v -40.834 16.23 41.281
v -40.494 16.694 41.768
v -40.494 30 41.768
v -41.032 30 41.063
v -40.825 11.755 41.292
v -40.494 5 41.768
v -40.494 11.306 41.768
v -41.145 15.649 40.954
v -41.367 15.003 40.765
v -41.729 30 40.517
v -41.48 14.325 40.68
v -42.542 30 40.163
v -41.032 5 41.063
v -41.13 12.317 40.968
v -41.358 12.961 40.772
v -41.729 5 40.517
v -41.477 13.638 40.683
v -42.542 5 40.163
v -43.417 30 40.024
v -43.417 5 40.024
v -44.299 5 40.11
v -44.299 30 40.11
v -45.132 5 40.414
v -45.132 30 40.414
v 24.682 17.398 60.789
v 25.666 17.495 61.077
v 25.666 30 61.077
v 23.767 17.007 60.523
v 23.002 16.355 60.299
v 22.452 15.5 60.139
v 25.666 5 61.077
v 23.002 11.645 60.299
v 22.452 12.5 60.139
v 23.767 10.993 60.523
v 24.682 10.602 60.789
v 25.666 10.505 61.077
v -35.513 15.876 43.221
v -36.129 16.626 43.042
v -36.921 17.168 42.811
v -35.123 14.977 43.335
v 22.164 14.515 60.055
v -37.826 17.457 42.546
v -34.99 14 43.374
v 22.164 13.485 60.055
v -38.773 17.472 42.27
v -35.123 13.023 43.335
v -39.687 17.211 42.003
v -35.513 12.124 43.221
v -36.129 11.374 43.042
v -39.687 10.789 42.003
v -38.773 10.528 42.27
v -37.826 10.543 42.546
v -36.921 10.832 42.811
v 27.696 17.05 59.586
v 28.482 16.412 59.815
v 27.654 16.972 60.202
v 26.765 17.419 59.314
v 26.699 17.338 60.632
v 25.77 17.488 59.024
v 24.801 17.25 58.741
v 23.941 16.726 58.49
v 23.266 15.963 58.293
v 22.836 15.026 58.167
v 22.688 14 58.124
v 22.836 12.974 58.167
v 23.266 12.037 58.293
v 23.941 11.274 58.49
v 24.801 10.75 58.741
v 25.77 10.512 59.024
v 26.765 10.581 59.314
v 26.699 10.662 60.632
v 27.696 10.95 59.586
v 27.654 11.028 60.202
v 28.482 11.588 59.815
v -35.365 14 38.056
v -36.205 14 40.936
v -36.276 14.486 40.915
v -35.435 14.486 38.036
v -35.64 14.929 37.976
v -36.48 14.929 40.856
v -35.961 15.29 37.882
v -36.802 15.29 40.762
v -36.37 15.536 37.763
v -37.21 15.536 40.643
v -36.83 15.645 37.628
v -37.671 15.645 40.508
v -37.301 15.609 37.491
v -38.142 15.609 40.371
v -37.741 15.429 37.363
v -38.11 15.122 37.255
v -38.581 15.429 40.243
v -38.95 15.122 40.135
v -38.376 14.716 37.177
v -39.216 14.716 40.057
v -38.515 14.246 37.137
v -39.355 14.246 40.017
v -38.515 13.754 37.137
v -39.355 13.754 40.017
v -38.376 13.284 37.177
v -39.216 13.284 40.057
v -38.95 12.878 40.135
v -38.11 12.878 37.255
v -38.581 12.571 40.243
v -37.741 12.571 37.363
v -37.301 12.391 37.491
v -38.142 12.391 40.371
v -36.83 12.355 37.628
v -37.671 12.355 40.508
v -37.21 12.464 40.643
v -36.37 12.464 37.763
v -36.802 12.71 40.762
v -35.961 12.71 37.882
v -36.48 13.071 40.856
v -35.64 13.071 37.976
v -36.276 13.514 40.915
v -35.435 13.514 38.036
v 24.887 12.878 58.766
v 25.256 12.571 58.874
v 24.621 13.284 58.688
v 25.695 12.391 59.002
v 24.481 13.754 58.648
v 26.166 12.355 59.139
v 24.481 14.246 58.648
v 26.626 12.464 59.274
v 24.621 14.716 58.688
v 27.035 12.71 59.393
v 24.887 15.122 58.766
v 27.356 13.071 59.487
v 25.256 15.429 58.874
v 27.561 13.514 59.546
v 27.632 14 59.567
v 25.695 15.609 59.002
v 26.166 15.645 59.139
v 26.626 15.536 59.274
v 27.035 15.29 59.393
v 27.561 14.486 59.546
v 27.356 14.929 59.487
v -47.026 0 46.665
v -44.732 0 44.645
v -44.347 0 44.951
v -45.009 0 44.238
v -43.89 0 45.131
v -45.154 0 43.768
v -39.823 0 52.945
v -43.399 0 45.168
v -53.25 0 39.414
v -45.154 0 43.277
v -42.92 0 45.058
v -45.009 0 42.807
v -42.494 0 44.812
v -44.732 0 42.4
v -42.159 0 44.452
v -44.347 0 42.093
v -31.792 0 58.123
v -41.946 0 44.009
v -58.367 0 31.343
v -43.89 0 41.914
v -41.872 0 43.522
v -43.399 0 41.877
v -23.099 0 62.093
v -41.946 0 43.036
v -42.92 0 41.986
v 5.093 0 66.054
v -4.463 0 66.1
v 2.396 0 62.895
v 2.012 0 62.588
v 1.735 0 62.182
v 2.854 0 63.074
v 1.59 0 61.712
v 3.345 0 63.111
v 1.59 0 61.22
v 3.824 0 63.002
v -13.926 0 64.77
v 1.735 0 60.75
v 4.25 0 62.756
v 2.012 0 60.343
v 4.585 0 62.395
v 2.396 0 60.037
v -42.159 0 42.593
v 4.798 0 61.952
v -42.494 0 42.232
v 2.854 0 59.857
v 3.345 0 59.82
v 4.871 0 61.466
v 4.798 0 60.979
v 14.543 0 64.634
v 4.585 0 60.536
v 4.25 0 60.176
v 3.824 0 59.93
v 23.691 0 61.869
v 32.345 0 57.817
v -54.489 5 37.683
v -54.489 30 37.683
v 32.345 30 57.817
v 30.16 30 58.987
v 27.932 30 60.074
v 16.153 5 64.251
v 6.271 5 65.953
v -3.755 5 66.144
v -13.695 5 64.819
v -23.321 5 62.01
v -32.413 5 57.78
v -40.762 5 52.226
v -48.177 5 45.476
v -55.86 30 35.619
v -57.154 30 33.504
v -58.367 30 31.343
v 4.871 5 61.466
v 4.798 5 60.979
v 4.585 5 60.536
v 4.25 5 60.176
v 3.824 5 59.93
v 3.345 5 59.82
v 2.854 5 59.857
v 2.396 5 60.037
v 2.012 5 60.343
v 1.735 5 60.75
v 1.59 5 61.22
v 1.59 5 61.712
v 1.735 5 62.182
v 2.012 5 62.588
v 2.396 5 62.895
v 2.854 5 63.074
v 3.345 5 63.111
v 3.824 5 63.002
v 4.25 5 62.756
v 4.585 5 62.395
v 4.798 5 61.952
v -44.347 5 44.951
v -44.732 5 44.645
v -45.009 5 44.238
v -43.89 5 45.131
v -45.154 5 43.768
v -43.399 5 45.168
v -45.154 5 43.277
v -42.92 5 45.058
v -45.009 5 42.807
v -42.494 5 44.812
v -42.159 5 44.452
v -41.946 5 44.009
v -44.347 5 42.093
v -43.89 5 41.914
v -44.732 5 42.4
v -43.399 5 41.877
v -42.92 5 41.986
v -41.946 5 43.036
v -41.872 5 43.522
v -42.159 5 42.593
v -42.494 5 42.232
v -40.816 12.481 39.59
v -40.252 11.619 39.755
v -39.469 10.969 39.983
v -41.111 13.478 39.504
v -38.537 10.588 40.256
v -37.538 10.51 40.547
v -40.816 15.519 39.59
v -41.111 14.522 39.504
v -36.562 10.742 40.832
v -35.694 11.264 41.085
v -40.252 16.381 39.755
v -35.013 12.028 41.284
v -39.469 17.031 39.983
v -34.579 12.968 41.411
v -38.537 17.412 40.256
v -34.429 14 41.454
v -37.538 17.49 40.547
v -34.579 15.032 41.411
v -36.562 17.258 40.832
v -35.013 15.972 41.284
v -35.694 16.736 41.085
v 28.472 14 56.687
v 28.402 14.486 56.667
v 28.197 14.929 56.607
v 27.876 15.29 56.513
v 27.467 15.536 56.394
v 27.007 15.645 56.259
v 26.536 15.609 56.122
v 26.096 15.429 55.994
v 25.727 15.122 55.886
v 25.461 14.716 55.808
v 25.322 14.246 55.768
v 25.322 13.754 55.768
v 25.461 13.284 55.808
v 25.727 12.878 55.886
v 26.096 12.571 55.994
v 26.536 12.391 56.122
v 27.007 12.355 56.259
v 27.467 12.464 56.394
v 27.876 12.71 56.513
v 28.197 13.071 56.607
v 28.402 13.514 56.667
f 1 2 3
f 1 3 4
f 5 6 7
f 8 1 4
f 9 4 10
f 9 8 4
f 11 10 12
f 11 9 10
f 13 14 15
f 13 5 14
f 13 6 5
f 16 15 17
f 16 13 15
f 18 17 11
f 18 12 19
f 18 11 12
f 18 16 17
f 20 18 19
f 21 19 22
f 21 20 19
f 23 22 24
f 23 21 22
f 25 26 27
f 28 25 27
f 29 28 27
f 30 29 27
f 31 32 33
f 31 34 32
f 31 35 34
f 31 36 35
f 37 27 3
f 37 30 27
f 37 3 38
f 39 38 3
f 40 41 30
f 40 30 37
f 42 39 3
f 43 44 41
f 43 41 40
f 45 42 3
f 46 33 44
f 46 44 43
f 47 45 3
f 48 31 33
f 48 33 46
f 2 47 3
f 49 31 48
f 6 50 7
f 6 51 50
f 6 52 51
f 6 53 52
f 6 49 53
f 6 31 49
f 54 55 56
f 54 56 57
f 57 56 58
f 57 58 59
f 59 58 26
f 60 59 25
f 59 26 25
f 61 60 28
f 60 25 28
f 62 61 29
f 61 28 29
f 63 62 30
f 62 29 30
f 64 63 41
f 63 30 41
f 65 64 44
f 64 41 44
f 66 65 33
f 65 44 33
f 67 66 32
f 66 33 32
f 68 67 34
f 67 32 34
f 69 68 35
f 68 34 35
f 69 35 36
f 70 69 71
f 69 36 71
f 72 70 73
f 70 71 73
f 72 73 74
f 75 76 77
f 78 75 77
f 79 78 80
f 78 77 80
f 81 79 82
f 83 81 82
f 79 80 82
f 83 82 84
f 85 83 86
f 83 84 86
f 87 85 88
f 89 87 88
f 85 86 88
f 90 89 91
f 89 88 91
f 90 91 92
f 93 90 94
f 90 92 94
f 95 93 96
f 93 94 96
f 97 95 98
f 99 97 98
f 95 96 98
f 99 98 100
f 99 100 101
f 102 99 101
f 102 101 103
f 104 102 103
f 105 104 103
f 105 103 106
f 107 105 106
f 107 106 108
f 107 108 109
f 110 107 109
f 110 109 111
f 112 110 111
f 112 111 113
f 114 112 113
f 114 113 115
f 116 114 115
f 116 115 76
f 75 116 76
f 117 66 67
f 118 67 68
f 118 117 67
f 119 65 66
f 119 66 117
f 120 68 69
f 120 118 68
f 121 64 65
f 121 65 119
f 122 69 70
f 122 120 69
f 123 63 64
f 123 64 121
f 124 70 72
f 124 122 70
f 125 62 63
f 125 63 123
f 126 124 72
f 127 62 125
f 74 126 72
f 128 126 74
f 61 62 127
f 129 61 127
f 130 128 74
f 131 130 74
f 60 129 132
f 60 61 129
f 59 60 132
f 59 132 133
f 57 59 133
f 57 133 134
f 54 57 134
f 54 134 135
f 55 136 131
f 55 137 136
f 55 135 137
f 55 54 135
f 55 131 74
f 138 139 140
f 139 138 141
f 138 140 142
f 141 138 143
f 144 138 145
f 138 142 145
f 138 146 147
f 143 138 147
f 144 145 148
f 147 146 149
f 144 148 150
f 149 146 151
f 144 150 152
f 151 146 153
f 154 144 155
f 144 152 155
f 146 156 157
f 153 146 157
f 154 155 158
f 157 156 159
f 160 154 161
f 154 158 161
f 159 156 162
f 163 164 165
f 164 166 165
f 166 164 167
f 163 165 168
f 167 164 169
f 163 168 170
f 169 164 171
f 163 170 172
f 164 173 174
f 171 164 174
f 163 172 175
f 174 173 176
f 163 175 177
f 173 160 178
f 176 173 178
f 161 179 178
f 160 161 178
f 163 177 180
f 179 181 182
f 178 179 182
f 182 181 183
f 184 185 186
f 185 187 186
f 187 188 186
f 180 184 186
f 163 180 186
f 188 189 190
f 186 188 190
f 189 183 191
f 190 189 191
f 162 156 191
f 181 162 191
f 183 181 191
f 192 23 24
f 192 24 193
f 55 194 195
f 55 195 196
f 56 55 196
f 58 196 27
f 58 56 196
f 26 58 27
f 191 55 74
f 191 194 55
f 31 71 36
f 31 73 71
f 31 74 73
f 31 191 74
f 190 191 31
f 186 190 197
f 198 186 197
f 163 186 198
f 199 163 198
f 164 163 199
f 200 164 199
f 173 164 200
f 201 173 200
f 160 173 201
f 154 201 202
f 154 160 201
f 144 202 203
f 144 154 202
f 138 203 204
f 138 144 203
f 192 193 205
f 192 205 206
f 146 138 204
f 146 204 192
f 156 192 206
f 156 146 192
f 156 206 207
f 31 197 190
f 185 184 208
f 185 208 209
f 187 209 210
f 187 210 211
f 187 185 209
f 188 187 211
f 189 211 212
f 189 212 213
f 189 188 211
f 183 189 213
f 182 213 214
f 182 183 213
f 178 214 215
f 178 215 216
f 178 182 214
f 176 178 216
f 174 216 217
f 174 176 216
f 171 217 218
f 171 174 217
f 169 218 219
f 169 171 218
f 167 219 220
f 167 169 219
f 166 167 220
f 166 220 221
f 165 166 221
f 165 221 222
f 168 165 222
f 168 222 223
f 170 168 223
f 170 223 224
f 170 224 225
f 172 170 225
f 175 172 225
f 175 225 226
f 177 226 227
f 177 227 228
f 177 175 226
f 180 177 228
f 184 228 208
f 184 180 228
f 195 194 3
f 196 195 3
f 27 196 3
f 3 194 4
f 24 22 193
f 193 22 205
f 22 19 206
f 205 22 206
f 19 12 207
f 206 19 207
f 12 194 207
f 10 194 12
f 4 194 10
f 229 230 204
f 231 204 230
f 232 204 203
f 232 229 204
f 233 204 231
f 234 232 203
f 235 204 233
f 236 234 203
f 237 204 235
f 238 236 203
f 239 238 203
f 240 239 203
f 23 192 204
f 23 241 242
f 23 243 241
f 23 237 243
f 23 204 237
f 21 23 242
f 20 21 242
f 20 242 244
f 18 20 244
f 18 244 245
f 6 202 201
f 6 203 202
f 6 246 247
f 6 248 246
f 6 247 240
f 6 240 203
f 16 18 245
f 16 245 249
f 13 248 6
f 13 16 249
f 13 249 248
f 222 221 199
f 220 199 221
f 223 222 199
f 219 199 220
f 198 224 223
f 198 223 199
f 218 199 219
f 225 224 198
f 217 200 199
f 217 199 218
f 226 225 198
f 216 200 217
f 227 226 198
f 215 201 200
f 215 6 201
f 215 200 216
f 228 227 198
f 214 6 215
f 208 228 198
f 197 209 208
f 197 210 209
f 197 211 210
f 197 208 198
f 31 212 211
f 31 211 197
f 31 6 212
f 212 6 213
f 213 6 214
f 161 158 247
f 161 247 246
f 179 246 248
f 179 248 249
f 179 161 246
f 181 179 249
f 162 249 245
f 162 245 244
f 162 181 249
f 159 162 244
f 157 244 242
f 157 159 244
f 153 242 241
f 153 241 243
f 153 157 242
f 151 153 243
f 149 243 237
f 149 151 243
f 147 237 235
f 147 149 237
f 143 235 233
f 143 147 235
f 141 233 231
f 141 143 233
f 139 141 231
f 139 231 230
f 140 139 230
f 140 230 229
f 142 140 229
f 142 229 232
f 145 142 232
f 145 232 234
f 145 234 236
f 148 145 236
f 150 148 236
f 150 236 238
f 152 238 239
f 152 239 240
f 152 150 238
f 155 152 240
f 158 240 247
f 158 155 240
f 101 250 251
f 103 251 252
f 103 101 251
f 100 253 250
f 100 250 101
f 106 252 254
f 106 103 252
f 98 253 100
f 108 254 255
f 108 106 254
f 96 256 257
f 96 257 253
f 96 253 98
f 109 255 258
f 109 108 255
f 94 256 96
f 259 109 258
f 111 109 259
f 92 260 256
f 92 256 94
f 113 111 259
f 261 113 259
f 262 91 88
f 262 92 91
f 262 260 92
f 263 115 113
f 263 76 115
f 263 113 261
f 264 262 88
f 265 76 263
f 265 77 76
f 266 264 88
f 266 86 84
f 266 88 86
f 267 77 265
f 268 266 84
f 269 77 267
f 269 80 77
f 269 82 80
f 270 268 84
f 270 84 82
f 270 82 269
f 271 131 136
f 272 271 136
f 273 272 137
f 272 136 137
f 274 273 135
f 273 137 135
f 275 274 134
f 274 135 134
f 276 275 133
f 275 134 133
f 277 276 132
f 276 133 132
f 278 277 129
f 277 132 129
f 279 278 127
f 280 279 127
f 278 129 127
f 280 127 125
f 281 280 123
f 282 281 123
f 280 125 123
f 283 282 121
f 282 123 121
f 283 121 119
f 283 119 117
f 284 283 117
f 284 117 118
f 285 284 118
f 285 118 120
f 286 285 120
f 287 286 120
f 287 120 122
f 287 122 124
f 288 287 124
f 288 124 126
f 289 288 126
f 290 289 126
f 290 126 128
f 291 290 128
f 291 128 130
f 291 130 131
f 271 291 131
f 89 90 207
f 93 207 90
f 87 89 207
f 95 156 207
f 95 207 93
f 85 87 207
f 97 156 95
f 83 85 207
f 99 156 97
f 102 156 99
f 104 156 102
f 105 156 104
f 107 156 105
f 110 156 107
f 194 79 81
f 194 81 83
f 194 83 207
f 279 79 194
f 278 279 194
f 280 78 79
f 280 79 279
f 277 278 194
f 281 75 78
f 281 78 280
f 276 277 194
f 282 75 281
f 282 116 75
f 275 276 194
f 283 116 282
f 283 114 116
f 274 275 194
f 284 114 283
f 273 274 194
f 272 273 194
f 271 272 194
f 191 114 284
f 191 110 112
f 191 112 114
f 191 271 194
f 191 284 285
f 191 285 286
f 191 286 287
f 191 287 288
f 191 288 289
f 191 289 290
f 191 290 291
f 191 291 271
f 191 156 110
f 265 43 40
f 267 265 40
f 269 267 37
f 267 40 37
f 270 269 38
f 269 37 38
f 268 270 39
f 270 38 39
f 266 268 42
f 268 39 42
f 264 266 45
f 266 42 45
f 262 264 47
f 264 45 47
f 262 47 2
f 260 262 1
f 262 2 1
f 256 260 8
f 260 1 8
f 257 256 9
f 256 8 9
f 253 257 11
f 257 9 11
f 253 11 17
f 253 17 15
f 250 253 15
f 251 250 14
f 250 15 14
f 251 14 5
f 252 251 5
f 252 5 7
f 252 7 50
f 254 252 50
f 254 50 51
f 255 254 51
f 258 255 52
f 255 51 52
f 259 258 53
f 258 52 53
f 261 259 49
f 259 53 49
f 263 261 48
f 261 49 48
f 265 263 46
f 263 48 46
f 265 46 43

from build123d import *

# Parameters (mm, degrees)
SKETCH1_R           = 1.65
BOSS_EXTRUDE1_DEPTH = 5
BOSS_EXTRUDE2_DEPTH = 25
SKETCH3_R           = 1.65
CUT_EXTRUDE1_DEPTH  = 31.640005718
SKETCH4_R           = 3.5
CUT_EXTRUDE2_DEPTH  = 2
SKETCH5_R           = 67.5
SKETCH5_R_2         = 66.25
CUT_EXTRUDE3_DEPTH  = 31.0000001


with BuildPart() as part:
    # Sketch1 → Boss-Extrude1 (new body)
    with BuildSketch(Plane(origin=(0, 0, 0), x_dir=(1, 0, 0), z_dir=(0, 1, 0))):
        with BuildLine():
            ThreePointArc((-58.769725256, -31.225340563), (-18.644922026, -63.884813396), (32.748082014, -57.935012077))
            Line((32.748082014, -57.935012077), (-58.769725256, -31.225340563))
        make_face()
        with Locations((-43.522422382, -43.522422382)):
            Circle(SKETCH1_R, mode=Mode.SUBTRACT)
        with Locations((3.221278107, -61.465647864)):
            Circle(SKETCH1_R, mode=Mode.SUBTRACT)
    extrude(amount=BOSS_EXTRUDE1_DEPTH)

    # Sketch2 → Boss-Extrude2 (add)
    with BuildSketch(Plane(origin=(0, 5, 0), x_dir=(1, 0, 0), z_dir=(0, 1, 0))):
        with BuildLine():
            Line((-58.769725256, -31.225340563), (32.748082014, -57.935012077))
            ThreePointArc((32.748082014, -57.935012077), (29.480015366, -59.664320946), (26.120952253, -61.20946294))
            Line((26.120952253, -61.20946294), (-40.494047404, -41.767730103))
            ThreePointArc((-40.494047404, -41.767730103), (-42.54184797, -40.162589972), (-45.131562946, -40.414261085))
            Line((-45.131562946, -40.414261085), (-54.944236671, -37.550410872))
            ThreePointArc((-54.944236671, -37.550410872), (-56.94486731, -34.441030575), (-58.769725256, -31.225340563))
        make_face()
    extrude(amount=BOSS_EXTRUDE2_DEPTH)

    # Sketch3 → Cut-Extrude1 (cut, through all)
    with BuildSketch(Plane(origin=(-14.411642209, 0, 49.379936906), x_dir=(0.959952117, 0, 0.280164118), z_dir=(-0.280164118, 0, 0.959952117))):
        with Locations((41.56355859, 14)):
            Circle(SKETCH3_R)
        with Locations((-24.93644141, 14)):
            Circle(SKETCH3_R)
    extrude(amount=-CUT_EXTRUDE1_DEPTH, mode=Mode.SUBTRACT)

    # Sketch4 → Cut-Extrude2 (cut)
    with BuildSketch(Plane(origin=(-14.411642209, 0, 49.379936906), x_dir=(0.959952117, 0, 0.280164118), z_dir=(-0.280164118, 0, 0.959952117))):
        with Locations((41.56355859, 14)):
            Circle(SKETCH4_R)
        with Locations((-24.93644141, 14)):
            Circle(SKETCH4_R)
    extrude(amount=-CUT_EXTRUDE2_DEPTH, mode=Mode.SUBTRACT)

    # Sketch5 → Cut-Extrude3 (cut, through all)
    with BuildSketch(Plane.XZ):
        Circle(SKETCH5_R)
        Circle(SKETCH5_R_2, mode=Mode.SUBTRACT)
    extrude(amount=-CUT_EXTRUDE3_DEPTH, mode=Mode.SUBTRACT)


solid = part.part
